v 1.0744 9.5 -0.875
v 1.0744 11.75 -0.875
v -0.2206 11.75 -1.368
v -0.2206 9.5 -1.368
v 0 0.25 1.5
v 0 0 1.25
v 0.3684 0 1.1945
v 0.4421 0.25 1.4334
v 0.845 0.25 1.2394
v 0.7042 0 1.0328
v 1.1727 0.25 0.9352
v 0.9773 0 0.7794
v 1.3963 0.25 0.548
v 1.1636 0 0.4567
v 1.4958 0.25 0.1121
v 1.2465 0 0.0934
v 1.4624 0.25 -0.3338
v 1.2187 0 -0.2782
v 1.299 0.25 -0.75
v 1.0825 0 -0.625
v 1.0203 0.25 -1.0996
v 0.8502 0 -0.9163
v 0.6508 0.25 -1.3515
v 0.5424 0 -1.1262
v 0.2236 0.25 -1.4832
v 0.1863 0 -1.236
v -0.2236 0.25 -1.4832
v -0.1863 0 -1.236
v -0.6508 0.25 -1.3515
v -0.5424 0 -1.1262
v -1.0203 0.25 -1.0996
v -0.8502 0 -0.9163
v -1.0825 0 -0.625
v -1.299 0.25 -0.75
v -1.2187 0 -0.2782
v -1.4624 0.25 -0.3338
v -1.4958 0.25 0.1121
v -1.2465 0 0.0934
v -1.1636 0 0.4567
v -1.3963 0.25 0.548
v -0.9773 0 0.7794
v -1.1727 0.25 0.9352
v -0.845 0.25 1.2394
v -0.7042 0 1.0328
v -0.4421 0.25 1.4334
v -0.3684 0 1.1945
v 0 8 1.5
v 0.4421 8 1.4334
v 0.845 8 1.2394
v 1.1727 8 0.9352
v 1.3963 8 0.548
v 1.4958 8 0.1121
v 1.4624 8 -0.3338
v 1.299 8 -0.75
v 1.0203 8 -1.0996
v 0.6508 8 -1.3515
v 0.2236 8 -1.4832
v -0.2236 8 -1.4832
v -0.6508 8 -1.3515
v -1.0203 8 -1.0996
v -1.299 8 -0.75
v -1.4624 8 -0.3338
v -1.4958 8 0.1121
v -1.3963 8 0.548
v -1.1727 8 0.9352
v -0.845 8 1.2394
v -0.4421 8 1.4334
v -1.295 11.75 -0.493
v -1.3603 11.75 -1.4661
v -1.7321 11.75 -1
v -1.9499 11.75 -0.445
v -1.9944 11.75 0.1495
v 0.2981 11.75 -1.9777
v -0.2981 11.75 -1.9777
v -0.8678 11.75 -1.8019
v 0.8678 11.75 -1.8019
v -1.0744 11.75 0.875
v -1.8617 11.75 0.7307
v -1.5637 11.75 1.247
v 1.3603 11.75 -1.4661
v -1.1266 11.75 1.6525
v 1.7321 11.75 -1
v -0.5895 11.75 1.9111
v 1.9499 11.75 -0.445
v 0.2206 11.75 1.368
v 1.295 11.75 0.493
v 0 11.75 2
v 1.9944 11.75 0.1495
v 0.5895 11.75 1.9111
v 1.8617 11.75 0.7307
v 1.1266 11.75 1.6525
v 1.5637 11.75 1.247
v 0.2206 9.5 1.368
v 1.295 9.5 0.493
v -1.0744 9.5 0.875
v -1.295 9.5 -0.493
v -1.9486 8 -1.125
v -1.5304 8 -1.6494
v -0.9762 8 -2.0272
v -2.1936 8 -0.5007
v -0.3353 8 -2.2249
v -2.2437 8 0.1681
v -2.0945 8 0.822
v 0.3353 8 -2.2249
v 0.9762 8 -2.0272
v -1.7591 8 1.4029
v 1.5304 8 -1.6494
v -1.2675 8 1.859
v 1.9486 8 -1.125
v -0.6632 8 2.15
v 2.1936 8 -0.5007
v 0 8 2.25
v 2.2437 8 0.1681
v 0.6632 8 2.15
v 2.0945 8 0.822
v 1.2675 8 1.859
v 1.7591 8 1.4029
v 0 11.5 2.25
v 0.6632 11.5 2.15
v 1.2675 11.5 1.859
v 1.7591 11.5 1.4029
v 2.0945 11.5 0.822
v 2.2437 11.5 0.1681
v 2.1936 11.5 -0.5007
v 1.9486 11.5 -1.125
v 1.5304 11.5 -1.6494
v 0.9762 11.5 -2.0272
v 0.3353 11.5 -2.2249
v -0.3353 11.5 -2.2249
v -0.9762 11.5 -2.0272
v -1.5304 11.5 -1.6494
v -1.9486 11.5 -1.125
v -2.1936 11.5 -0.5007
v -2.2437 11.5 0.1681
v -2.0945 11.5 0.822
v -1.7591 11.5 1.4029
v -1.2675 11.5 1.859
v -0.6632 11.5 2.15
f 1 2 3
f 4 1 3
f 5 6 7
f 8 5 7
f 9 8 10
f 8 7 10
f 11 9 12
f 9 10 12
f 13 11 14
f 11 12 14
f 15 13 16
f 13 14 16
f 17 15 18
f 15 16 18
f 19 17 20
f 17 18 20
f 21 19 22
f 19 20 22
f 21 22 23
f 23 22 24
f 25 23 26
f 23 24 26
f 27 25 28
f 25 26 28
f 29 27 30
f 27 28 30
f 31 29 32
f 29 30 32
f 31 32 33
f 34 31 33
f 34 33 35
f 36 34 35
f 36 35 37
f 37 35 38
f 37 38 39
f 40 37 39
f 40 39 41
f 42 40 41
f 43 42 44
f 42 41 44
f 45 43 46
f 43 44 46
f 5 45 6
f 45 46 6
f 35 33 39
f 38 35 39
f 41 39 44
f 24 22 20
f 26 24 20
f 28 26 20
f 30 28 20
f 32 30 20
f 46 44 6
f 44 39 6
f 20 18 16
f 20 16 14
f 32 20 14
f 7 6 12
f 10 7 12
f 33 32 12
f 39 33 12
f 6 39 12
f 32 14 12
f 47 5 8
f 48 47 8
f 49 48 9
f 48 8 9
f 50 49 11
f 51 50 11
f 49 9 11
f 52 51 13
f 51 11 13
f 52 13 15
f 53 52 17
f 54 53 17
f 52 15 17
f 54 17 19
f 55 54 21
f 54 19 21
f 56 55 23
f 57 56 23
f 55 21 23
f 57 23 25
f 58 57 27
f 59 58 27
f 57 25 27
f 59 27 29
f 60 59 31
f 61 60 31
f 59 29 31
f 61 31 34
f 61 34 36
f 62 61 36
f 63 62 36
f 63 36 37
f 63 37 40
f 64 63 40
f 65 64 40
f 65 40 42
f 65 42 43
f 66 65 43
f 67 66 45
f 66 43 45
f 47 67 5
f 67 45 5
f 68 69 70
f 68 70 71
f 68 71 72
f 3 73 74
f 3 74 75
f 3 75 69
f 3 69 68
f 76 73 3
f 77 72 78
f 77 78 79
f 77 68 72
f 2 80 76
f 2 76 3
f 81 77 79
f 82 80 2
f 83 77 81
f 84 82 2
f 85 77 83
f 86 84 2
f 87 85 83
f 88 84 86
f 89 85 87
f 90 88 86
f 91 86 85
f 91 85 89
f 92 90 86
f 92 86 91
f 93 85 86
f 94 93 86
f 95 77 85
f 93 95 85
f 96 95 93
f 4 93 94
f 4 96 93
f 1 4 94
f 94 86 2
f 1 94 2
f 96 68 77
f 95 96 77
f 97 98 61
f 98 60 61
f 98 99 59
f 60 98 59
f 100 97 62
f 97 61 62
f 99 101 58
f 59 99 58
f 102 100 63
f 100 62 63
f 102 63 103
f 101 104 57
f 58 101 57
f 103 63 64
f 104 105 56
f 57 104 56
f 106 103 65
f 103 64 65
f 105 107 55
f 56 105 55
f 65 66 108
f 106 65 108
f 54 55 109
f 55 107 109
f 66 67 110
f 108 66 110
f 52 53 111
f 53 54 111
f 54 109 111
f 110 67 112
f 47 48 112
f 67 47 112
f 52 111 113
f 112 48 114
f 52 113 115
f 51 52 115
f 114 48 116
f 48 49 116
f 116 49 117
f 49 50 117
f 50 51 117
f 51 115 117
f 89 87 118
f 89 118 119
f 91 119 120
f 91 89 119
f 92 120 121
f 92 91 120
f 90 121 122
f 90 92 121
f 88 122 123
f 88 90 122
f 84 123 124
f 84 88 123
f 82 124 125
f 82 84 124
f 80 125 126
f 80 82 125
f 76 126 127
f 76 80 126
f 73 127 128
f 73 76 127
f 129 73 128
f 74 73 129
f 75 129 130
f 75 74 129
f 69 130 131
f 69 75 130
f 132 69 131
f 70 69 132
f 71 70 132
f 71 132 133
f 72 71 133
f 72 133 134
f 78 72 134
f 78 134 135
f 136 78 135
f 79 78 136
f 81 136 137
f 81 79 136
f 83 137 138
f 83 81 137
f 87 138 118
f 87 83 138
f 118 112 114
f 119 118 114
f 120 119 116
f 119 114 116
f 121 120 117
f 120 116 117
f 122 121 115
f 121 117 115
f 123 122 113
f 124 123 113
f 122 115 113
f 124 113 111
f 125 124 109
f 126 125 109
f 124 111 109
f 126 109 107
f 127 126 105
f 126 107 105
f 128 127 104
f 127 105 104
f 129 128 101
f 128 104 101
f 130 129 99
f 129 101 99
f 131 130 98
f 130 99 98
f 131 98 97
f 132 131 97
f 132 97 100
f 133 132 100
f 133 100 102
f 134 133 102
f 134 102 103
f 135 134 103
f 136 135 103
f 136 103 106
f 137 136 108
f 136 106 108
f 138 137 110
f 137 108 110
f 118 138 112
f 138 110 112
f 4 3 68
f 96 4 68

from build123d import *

# Parameters (mm, degrees)
SKICA1_R                 = 1.5
P_IDAT_VYSUNUT_M1_DEPTH  = 8
SKICA2_R                 = 2.25
P_IDAT_VYSUNUT_M2_DEPTH  = 3.75
ODEBRAT_VYSUNUT_M1_DEPTH = 2.25
ZKOSEN_1_SIZE            = 0.25
ZKOSEN_2_SIZE            = 0.25


with BuildPart() as part:
    # Skica1 → Přidat vysunutím1 (new body)
    with BuildSketch(Plane(origin=(0, 0, 0), x_dir=(1, 0, 0), z_dir=(0, 1, 0))):
        with Locations(Location((0, 0, 0), (0, 0, 270))):
            Circle(SKICA1_R)
    extrude(amount=P_IDAT_VYSUNUT_M1_DEPTH)

    # Skica2 → Přidat vysunutím2 (add)
    with BuildSketch(Plane(origin=(0, 8, 0), x_dir=(1, 0, 0), z_dir=(0, 1, 0))):
        with Locations(Location((0, 0, 0), (0, 0, 270))):
            Circle(SKICA2_R)
    extrude(amount=P_IDAT_VYSUNUT_M2_DEPTH)

    # Skica3 → Odebrat vysunutím1 (cut)
    with BuildSketch(Plane(origin=(0, 11.75, 0), x_dir=(1, 0, 0), z_dir=(0, 1, 0))):
        Polygon((-1.074402598, -0.875019461), (0.220587783, -1.367969674), (1.294990381, -0.492950213), (1.074402598, 0.875019461), (-0.220587783, 1.367969674), (-1.294990381, 0.492950213), align=None)
    extrude(amount=-ODEBRAT_VYSUNUT_M1_DEPTH, mode=Mode.SUBTRACT)

    # Zkosení1
    zkosen_1_edges = [part.edges().sort_by_distance(p)[0] for p in [
        (0, 11.75, -2.25),
    ]]
    chamfer(zkosen_1_edges, length=ZKOSEN_1_SIZE)

    # Zkosení2
    zkosen_2_edges = [part.edges().sort_by_distance(p)[0] for p in [
        (0, 0, -1.5),
    ]]
    chamfer(zkosen_2_edges, length=ZKOSEN_2_SIZE)


solid = part.part
